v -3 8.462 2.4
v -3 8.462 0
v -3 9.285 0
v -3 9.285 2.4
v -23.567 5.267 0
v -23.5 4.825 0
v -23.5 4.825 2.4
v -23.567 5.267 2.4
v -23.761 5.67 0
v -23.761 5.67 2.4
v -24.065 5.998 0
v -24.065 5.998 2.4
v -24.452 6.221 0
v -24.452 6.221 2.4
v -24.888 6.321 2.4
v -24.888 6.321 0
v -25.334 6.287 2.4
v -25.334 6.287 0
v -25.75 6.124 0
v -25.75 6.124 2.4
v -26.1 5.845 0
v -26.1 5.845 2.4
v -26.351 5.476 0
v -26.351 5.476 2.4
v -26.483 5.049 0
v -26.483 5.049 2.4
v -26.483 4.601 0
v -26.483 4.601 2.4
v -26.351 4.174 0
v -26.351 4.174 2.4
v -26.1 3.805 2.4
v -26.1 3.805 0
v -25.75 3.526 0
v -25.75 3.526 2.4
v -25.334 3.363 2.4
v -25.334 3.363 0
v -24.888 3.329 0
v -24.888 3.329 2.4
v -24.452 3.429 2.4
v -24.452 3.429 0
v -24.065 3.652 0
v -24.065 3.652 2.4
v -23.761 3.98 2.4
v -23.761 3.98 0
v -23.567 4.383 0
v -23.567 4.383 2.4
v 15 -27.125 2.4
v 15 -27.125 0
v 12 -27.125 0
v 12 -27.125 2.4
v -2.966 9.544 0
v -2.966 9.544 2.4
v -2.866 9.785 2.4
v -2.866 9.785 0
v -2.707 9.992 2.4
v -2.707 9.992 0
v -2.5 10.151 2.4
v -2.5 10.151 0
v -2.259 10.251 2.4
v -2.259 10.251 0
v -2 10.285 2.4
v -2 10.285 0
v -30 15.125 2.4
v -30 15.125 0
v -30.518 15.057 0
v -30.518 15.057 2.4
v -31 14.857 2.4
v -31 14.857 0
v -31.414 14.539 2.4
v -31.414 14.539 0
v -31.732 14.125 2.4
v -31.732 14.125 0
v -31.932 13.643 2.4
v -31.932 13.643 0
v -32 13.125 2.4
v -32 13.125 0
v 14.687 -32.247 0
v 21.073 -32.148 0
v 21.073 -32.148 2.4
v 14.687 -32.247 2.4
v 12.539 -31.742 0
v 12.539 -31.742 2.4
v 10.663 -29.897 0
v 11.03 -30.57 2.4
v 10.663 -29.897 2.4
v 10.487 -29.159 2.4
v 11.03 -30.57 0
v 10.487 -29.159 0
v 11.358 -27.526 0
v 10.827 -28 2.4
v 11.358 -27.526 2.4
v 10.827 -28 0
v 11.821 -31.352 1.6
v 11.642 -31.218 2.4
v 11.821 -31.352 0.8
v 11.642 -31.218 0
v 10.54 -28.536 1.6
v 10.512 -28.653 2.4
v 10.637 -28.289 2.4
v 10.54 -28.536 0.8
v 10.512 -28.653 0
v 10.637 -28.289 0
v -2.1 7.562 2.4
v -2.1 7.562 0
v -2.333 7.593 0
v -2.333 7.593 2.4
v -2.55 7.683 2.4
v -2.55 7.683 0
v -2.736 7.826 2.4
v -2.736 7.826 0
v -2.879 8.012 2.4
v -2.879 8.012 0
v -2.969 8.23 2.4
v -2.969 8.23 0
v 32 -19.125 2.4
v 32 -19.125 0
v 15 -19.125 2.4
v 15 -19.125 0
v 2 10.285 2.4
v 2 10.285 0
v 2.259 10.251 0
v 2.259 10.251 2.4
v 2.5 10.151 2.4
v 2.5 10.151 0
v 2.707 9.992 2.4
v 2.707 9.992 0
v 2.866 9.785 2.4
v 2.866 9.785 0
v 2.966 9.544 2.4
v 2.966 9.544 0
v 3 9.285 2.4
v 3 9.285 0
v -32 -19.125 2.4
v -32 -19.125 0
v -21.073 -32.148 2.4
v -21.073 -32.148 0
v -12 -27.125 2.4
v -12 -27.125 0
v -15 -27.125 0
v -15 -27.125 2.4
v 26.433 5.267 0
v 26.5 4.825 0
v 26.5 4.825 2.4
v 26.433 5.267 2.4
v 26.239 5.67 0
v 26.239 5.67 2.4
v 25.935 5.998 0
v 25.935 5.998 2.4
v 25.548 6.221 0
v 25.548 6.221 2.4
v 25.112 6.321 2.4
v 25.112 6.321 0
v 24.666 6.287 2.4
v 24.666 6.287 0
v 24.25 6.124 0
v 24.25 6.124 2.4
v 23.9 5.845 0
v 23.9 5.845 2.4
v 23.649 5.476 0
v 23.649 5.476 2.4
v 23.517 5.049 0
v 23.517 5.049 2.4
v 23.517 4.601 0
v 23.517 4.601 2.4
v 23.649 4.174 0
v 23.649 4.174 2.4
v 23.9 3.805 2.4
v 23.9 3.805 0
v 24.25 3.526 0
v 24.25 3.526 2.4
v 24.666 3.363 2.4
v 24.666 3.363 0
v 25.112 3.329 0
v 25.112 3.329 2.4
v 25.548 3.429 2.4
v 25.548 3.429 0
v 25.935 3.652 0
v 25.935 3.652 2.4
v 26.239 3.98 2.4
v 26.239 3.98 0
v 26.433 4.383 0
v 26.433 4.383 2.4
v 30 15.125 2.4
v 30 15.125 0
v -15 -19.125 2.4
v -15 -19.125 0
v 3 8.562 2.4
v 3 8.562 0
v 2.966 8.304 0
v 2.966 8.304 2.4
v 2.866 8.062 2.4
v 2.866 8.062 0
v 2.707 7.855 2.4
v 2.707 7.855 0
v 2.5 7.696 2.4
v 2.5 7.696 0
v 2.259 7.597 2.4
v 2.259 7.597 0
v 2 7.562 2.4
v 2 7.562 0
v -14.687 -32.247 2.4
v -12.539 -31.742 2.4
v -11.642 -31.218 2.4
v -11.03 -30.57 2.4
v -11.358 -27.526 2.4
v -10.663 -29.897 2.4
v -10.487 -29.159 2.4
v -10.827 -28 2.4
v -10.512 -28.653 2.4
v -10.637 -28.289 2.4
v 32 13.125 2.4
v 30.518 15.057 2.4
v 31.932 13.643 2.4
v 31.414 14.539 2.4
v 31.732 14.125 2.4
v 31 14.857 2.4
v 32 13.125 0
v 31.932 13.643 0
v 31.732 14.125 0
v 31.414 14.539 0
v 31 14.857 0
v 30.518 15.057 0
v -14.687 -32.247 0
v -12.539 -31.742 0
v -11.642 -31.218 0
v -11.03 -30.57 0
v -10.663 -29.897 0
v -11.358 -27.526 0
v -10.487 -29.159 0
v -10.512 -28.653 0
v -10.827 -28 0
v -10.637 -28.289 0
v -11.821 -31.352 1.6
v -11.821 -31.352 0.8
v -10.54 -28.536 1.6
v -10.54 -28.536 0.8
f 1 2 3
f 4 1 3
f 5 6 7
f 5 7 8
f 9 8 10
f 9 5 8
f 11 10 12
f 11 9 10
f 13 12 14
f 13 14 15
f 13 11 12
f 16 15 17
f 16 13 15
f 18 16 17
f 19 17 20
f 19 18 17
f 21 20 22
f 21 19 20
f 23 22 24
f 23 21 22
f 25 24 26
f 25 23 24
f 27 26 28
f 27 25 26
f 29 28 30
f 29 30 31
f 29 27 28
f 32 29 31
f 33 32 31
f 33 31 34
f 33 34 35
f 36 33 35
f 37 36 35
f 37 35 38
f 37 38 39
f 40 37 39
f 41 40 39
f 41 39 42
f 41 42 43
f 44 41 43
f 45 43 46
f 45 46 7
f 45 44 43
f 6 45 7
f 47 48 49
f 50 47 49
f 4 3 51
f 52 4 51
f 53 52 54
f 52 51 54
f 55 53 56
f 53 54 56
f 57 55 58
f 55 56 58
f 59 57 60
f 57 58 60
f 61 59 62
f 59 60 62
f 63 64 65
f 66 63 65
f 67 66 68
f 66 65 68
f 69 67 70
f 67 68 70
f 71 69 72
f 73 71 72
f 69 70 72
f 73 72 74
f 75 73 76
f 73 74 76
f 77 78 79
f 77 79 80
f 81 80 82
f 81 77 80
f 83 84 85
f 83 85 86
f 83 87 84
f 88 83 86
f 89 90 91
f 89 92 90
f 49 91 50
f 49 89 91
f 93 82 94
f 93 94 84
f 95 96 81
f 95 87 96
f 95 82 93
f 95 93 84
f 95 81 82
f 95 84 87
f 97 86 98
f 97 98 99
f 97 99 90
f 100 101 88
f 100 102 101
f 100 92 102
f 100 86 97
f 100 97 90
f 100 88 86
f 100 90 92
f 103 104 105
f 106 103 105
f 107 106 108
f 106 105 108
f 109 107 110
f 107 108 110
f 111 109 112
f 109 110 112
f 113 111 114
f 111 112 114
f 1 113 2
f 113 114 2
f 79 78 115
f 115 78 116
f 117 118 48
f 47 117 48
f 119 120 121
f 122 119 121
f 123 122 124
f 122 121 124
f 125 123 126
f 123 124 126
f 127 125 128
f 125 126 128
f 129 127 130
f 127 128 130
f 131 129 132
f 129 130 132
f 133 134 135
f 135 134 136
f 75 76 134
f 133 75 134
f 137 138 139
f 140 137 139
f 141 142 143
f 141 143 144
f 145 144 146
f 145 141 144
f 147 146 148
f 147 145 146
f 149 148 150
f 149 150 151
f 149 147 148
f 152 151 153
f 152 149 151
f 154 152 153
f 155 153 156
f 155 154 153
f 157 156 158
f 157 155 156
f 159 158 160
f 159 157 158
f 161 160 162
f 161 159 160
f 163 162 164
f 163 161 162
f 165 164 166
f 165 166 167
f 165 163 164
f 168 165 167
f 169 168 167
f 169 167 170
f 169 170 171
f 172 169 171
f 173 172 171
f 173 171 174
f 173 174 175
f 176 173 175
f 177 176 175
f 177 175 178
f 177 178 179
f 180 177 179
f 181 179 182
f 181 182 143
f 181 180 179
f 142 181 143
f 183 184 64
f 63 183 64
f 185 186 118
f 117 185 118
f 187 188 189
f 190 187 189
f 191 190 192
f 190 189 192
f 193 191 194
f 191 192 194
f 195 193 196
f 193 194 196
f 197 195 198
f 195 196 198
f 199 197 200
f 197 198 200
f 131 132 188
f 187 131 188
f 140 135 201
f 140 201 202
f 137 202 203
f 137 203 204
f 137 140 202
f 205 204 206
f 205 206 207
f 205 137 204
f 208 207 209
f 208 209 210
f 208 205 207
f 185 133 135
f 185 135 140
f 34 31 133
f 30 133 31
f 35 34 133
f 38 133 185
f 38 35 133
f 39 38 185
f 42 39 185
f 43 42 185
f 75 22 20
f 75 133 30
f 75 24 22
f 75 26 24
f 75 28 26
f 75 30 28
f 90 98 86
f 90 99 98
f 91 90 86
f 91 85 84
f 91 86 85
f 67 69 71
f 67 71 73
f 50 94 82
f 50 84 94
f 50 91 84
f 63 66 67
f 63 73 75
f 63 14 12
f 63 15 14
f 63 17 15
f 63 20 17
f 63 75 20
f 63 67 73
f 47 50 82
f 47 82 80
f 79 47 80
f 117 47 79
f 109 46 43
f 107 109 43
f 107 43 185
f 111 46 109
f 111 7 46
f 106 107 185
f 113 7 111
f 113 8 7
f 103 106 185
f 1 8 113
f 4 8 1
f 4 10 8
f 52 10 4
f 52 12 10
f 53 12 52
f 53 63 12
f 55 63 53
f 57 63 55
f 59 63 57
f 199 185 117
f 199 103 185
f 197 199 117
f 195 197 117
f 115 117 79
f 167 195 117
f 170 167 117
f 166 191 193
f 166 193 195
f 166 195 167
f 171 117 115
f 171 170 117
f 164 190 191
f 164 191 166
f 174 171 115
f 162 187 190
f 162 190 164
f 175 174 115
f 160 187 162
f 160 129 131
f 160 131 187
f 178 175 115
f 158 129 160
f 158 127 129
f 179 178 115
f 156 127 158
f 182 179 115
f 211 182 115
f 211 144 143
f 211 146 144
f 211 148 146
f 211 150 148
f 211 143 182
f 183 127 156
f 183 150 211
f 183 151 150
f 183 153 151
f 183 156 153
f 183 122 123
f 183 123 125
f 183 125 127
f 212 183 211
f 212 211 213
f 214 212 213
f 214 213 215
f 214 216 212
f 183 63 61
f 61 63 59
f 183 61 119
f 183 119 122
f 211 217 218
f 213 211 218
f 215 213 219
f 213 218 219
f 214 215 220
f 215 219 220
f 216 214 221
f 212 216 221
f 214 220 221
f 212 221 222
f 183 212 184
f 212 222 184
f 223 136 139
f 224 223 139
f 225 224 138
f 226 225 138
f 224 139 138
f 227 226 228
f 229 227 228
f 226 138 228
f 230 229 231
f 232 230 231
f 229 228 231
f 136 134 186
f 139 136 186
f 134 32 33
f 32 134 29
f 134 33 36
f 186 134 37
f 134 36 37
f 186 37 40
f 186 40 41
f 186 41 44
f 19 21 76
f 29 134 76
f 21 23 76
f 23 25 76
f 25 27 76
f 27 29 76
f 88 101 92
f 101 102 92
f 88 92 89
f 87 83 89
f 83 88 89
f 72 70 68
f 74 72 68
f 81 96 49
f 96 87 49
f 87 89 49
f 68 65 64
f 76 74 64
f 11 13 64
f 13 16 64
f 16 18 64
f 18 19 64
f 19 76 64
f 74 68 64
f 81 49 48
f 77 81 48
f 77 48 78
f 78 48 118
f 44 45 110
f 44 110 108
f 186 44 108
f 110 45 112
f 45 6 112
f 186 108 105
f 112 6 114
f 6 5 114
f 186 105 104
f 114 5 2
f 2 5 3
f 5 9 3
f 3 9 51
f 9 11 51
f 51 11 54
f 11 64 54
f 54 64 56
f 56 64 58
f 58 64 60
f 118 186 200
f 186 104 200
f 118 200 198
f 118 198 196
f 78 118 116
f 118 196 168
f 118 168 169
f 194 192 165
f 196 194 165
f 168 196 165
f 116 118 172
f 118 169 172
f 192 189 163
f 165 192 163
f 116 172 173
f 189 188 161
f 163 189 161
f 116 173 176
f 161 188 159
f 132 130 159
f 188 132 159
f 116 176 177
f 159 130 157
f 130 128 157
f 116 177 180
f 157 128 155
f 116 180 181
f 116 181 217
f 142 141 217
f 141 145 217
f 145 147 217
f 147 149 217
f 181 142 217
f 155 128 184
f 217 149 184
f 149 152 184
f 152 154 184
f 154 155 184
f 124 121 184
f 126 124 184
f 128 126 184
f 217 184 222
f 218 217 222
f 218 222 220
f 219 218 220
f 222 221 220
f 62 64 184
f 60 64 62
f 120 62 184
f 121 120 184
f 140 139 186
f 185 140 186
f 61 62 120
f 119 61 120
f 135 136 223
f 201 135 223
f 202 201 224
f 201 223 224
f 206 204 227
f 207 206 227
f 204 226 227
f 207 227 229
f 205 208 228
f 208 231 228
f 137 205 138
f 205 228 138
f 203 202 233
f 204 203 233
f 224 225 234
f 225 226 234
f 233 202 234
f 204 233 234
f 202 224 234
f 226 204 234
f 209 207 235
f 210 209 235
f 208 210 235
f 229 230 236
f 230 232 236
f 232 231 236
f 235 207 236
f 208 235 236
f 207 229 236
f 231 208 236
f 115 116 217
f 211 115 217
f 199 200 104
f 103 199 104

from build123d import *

# Parameters (mm, degrees)
F0_R     = 1.5
F1_DEPTH = 2.4


with BuildPart() as f1:
    # F0 (on Top) → F1 (new body)
    with BuildSketch(Plane.XY):
        with BuildLine():
            Line((0, 15.125), (-30, 15.125))
            ThreePointArc((-30, 15.125), (-31.4142135624, 14.5392135624), (-32, 13.125))
            Line((-32, 13.125), (-32, -15.125))
            Line((-32, -15.125), (32, -15.125))
            Line((32, -15.125), (32, 13.125))
            ThreePointArc((32, 13.125), (31.4142135624, 14.5392135624), (30, 15.125))
            Line((30, 15.125), (0, 15.125))
        make_face()
        with Locations((-25, 4.825)):
            Circle(F0_R, mode=Mode.SUBTRACT)
        with BuildLine():
            Line((-2, 10.285), (0, 10.285))
            Line((0, 10.285), (2, 10.285))
            ThreePointArc((2, 10.285), (2.7071067812, 9.9921067812), (3, 9.285))
            Line((3, 9.285), (3, 8.5625))
            ThreePointArc((3, 8.5625), (2.7071067812, 7.8553932188), (2, 7.5625))
            Line((2, 7.5625), (0, 7.5625))
            Line((0, 7.5625), (-2.1, 7.5625))
            ThreePointArc((-2.1, 7.5625), (-2.7363961031, 7.8261038969), (-3, 8.4625))
            Line((-3, 8.4625), (-3, 9.285))
            ThreePointArc((-3, 9.285), (-2.7071067812, 9.9921067812), (-2, 10.285))
        make_face(mode=Mode.SUBTRACT)
        with Locations((25, 4.825)):
            Circle(F0_R, mode=Mode.SUBTRACT)
        Polygon((32, -15.125), (-32, -15.125), (-32, -19.125), (-15, -19.125), (0, -19.125), (15, -19.125), (32, -19.125), align=None)
        with BuildLine():
            Line((-15, -19.125), (-32, -19.125))
            Line((-32, -19.125), (-21.0726106353, -32.147755533))
            add(Edge.make_bspline(
                [(-21.0726106353, -32.147755533), (-17.3698433438, -32.3941137596), (-11.5299816466, -32.7826604485), (-9.9449620452, -28.3358600834), (-11.3646535712, -27.4993559227), (-12, -27.125)],
                knots=[0, 0, 0, 0, 0.4890736176, 0.7713480383, 1, 1, 1, 1], degree=3))
            Line((-12, -27.125), (-15, -27.125))
            Line((-15, -27.125), (-15, -19.125))
        make_face()
        with BuildLine():
            Line((21.0726106353, -32.147755533), (32, -19.125))
            Line((32, -19.125), (15, -19.125))
            Line((15, -19.125), (15, -27.125))
            Line((15, -27.125), (12, -27.125))
            add(Edge.make_bspline(
                [(21.0726106353, -32.147755533), (17.3698433438, -32.3941137596), (11.5299816466, -32.7826604485), (9.9449620452, -28.3358600834), (11.3646535712, -27.4993559227), (12, -27.125)],
                knots=[0, 0, 0, 0, 0.4890736176, 0.7713480383, 1, 1, 1, 1], degree=3))
        make_face()
    extrude(amount=F1_DEPTH)


solid = f1.part
